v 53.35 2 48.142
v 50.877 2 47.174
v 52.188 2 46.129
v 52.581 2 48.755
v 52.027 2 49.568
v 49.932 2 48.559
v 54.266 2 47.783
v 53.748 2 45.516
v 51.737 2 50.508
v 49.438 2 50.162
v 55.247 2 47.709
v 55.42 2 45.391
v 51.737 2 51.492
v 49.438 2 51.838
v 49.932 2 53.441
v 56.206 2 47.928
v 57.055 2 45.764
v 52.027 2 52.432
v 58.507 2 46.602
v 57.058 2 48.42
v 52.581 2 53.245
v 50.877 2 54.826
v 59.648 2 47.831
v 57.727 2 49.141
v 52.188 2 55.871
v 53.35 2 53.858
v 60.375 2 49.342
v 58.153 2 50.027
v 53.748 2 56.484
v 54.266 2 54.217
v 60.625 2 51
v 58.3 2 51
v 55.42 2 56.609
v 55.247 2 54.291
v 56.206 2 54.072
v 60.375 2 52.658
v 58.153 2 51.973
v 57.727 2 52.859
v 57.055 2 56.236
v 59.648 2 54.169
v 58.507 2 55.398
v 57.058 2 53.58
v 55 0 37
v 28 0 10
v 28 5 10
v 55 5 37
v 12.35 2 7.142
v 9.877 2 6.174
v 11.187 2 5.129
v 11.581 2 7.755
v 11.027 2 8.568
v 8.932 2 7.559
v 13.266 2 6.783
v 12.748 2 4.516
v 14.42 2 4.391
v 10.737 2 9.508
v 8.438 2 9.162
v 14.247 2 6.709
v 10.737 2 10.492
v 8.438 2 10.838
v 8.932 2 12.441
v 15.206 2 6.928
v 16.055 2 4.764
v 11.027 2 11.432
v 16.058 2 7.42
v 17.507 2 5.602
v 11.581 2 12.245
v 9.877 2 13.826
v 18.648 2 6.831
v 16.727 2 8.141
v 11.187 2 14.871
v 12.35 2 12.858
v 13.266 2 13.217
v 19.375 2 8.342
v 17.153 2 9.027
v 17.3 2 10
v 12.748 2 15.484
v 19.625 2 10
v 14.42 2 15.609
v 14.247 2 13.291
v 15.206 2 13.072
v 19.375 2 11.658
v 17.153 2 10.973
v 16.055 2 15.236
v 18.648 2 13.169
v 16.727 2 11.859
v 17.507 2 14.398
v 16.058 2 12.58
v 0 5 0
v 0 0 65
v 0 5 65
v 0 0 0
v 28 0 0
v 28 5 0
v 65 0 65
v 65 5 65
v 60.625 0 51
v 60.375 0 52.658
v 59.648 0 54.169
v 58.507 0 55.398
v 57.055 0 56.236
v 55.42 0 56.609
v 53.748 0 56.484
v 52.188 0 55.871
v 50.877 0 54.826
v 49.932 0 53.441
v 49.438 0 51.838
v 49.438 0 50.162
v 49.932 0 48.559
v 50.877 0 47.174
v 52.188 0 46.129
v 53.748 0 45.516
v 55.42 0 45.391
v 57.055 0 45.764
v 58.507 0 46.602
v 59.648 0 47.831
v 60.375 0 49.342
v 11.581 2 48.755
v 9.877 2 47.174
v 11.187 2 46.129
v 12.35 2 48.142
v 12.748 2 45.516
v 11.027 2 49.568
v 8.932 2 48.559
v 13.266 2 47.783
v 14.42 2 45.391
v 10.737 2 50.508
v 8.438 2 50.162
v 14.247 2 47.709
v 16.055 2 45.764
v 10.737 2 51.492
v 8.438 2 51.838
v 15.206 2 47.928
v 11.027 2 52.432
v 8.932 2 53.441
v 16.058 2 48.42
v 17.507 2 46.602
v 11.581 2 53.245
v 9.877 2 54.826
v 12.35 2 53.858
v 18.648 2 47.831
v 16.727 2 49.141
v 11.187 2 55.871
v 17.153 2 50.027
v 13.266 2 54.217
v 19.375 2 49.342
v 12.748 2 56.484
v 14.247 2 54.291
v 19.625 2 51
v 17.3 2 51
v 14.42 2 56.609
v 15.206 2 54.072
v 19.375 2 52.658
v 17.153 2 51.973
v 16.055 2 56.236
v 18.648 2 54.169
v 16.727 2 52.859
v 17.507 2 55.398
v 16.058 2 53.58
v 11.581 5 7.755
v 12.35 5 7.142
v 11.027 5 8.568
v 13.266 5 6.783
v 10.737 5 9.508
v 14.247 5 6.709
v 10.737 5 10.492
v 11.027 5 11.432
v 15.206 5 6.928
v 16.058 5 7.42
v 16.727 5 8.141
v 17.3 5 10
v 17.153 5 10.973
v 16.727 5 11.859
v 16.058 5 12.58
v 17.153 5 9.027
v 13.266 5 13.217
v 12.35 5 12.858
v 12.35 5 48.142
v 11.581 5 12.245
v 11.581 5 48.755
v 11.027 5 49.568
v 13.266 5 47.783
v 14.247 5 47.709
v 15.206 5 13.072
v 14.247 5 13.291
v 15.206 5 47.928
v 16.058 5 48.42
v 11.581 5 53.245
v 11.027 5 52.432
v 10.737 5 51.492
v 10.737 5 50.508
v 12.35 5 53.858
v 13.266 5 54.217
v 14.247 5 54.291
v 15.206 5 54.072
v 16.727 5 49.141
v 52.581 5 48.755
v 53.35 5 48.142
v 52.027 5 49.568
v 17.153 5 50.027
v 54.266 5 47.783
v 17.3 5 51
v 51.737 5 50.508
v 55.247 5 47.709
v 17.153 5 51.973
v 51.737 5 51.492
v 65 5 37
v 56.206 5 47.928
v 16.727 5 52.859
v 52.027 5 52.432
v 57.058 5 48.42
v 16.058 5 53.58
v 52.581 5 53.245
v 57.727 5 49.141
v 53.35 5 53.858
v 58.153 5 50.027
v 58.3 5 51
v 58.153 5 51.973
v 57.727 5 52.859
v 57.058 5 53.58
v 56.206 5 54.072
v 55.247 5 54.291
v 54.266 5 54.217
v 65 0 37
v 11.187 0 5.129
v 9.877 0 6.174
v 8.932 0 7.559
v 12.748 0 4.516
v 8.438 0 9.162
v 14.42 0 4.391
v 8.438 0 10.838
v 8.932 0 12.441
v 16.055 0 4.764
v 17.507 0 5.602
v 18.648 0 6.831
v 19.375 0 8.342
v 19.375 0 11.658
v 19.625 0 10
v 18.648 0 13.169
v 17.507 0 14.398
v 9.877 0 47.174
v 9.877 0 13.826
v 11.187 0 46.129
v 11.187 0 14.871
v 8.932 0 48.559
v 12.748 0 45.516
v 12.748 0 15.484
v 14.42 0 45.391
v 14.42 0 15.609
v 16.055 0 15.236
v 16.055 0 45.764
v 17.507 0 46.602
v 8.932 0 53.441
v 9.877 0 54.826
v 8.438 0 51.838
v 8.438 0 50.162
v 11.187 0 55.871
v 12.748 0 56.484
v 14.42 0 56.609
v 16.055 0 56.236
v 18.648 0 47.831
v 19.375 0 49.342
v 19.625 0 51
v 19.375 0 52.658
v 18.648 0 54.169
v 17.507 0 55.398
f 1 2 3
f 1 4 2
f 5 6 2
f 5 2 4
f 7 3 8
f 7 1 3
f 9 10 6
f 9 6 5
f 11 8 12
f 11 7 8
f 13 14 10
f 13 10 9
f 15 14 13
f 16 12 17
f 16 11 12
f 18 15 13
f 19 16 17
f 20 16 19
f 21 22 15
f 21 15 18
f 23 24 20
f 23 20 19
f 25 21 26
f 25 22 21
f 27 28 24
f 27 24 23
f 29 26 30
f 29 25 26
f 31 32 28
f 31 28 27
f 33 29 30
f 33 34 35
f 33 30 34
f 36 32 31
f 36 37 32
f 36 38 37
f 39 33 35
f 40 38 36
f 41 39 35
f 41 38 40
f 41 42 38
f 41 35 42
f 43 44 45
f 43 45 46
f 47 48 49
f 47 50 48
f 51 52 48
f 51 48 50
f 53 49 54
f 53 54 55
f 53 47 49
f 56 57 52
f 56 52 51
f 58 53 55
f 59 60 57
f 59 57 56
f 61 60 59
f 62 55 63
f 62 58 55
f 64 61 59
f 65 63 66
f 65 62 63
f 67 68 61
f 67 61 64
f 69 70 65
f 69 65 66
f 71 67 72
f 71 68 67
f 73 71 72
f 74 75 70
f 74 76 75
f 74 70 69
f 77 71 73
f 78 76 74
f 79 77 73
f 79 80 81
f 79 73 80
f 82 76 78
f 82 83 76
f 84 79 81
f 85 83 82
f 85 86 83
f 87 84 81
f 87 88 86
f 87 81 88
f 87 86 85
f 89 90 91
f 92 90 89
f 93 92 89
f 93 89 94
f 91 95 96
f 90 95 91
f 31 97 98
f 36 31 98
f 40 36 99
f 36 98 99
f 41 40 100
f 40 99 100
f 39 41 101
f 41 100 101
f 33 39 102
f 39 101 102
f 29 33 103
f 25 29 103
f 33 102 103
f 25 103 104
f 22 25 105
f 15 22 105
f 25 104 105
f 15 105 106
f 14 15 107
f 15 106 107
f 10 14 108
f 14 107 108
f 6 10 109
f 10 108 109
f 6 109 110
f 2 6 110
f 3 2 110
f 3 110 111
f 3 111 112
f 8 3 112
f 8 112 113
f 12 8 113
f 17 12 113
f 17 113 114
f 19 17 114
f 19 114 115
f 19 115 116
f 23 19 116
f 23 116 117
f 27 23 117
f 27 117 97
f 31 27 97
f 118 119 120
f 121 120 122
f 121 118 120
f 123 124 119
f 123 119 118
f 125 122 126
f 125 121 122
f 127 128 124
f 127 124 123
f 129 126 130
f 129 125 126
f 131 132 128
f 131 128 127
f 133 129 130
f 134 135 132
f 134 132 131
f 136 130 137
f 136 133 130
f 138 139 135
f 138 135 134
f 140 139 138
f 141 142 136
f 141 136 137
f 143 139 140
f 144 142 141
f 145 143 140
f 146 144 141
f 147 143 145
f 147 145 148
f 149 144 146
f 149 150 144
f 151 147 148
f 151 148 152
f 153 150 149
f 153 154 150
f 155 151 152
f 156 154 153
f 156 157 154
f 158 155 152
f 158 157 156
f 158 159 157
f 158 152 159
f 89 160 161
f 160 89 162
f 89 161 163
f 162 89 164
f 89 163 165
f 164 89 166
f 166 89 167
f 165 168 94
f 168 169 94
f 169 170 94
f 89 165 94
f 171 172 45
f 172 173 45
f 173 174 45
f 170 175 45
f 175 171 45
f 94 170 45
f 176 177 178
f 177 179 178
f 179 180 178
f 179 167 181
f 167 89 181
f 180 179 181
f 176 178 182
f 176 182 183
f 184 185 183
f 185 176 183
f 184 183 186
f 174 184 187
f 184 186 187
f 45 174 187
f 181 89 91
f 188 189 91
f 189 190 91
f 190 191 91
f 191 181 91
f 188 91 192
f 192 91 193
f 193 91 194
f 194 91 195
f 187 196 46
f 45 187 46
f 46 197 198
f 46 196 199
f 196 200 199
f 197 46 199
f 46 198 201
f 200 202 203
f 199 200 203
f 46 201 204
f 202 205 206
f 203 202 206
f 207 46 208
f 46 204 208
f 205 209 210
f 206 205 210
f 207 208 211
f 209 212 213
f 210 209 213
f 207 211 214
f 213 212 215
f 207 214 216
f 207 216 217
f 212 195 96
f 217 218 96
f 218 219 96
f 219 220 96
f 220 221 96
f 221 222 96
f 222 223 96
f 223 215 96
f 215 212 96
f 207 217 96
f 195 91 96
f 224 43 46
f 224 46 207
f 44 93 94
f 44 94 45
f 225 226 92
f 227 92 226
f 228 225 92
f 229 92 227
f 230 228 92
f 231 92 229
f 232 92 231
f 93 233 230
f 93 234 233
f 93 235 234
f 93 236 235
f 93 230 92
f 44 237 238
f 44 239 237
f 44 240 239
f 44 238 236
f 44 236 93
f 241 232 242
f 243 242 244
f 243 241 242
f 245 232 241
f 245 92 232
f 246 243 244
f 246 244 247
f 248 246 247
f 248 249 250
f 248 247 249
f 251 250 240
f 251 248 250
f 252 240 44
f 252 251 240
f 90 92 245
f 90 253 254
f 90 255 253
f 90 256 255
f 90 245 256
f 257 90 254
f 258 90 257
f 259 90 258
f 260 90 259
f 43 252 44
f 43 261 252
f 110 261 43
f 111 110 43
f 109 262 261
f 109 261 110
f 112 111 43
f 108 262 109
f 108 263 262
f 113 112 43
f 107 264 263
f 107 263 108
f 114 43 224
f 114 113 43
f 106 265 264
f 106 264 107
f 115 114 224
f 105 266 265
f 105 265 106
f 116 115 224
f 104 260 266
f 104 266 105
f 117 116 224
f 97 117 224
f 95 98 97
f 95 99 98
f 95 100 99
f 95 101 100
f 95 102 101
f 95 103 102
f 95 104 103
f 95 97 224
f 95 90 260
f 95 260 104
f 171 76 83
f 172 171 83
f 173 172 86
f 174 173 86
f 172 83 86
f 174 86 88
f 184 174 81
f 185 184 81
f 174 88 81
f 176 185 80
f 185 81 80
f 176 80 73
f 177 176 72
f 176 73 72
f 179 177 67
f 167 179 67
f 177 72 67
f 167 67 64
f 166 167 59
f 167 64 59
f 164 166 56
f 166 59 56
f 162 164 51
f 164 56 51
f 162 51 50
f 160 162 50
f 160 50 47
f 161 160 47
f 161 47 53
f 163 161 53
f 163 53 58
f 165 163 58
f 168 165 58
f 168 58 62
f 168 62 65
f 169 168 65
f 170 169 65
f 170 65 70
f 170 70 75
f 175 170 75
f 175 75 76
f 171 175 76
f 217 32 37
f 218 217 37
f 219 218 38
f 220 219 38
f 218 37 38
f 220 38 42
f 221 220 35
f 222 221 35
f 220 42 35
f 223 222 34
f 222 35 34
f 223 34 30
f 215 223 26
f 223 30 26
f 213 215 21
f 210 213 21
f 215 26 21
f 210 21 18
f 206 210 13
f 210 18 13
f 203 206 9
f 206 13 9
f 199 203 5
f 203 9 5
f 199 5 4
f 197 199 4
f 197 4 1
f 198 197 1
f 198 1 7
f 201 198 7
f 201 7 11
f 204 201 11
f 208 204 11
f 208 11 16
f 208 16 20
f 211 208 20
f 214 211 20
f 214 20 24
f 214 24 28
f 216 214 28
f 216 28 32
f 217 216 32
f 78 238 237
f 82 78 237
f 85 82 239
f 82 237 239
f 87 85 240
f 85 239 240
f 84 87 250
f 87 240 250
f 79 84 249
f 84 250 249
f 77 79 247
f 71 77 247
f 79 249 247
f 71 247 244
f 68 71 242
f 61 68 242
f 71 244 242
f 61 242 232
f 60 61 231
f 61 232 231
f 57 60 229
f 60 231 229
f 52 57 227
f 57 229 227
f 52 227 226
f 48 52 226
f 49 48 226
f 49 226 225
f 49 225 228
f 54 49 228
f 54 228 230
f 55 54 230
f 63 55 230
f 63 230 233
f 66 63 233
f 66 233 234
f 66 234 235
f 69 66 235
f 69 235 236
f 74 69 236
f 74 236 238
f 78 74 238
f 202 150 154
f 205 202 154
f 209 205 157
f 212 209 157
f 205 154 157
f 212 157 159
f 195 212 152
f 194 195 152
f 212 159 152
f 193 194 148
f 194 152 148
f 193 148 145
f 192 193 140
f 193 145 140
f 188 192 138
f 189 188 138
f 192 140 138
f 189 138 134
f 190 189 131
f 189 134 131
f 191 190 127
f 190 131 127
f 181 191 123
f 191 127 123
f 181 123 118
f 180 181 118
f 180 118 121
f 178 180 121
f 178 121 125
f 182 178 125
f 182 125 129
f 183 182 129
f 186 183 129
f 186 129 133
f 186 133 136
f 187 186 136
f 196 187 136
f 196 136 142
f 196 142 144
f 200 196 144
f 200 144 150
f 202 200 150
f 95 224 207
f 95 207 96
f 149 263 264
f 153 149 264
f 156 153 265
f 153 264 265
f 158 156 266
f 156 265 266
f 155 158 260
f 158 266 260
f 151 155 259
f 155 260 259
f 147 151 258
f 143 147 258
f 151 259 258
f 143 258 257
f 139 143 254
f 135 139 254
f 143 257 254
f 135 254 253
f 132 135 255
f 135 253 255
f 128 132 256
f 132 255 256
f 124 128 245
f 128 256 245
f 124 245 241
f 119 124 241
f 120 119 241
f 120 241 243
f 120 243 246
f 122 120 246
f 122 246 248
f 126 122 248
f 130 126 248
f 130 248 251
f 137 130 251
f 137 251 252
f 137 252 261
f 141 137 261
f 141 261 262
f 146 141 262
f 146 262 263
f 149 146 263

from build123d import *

# Parameters (mm, degrees)
F0_R           = 3.3
F1_DEPTH       = 5
F2_D           = 6.6
F2_DEPTH       = 20
F2_CBORE_D     = 11.25
F2_CBORE_DEPTH = 2


with BuildPart() as f1:
    # F0 (on Front) → F1 (new body)
    with BuildSketch(Plane.XZ):
        Polygon((0, 65), (0, 0), (28, 0), (28, 10), (55, 37), (65, 37), (65, 65), align=None)
        with Locations((14, 10)):
            Circle(F0_R, mode=Mode.SUBTRACT)
        with Locations((14, 51)):
            Circle(F0_R, mode=Mode.SUBTRACT)
        with Locations((55, 51)):
            Circle(F0_R, mode=Mode.SUBTRACT)
    extrude(amount=-F1_DEPTH)

    # F2
    with Locations(Plane.XZ):
        with Locations((14, 51), (55, 51), (14, 10)):
            CounterBoreHole(F2_D / 2, F2_CBORE_D / 2, F2_CBORE_DEPTH, depth=F2_DEPTH)


solid = f1.part
